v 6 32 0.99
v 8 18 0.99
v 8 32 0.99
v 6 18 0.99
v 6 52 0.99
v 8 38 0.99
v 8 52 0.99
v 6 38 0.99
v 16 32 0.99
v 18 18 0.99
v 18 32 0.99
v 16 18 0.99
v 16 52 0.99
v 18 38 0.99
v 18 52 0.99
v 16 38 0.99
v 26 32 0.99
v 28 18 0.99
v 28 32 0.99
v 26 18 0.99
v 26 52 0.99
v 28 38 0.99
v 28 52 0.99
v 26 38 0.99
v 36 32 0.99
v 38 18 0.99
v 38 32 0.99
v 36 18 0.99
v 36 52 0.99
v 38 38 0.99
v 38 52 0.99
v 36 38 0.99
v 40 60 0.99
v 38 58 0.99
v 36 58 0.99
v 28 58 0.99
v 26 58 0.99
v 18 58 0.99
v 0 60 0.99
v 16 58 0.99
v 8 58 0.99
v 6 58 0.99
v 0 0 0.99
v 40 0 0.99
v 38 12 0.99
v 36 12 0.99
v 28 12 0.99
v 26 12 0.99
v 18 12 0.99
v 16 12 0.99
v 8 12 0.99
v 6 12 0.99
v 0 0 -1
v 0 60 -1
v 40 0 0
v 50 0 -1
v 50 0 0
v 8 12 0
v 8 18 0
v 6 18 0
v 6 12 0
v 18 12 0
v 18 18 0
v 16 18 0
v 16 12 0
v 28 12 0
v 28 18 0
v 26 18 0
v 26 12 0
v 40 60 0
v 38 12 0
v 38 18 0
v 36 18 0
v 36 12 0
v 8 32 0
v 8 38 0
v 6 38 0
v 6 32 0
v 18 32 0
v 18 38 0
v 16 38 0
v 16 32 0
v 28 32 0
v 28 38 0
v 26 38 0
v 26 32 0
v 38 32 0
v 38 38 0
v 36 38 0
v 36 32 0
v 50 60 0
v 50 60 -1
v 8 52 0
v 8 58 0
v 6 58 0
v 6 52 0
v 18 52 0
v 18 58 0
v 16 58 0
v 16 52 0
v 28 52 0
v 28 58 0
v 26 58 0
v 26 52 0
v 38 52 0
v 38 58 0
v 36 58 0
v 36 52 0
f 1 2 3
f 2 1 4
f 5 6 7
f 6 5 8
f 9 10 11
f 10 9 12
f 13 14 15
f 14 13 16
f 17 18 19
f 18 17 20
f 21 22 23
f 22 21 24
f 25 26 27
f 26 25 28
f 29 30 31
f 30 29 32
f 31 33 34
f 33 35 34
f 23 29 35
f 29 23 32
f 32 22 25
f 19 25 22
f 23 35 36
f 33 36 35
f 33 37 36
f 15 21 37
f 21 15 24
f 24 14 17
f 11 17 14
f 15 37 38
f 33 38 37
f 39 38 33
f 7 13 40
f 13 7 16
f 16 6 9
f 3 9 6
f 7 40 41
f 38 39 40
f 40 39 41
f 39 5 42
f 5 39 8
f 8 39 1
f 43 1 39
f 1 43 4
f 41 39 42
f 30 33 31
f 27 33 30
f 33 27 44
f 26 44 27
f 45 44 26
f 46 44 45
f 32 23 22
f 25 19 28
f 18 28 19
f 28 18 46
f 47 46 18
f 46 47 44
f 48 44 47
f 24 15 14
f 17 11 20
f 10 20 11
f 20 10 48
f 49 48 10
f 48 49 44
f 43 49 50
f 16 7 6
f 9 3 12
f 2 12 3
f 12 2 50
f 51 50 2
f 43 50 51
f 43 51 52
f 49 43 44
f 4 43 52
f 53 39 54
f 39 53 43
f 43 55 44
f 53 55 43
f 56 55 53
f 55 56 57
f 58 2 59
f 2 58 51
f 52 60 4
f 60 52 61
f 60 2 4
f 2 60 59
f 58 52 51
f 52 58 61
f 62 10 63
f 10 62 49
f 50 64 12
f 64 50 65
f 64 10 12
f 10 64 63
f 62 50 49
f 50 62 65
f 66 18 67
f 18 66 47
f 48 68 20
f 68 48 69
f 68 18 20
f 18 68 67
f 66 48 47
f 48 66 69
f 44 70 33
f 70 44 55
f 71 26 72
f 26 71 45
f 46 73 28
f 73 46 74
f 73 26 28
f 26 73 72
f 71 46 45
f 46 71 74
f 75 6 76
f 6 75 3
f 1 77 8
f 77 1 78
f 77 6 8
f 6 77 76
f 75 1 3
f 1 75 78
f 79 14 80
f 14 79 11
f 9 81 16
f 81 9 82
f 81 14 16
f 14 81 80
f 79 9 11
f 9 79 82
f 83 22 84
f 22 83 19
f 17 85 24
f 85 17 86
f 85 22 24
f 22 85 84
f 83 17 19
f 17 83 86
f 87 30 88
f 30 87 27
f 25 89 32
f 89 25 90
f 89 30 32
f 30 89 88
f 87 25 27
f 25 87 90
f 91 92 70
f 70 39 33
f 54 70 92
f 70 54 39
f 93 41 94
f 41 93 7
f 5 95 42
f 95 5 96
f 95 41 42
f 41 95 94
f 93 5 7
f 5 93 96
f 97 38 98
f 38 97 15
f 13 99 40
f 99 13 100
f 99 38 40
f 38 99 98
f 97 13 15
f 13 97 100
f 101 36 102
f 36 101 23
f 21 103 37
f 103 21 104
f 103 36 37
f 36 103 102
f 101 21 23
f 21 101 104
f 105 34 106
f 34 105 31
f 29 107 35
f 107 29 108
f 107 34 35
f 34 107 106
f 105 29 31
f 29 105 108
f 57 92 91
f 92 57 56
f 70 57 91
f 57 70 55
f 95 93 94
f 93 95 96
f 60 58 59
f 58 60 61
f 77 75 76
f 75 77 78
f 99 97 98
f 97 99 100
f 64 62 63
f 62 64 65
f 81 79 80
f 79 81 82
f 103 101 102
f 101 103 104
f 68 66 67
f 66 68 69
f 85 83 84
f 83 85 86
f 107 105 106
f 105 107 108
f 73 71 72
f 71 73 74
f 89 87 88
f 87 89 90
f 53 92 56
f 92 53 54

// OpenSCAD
// file: ../../Base/Boxes.scad
// Fischertechnik Box Foundation
// Pre-designed Boxes

use <Constants.scad>

include <PlacementOptions.scad>

box190Width = 190;
box190Depth = 130;
box130Width = 130;
box130Depth = 95;
boxUsageHeight = 33.9;
boxWallThickness = 2.4;
boxBaseThickness = 1.0;
boxWebWidth = 3.0;

// getBoxWallThickness()
// Gets the wall thickness of a Fischertechnik Box

function getBoxWallThickness() = boxWallThickness;

// Gets the usable height of a fischertechnik box
function getBoxUsageHeight() = boxUsageHeight;

// Gets the thickness of the Fischertechnik box base.
function getBoxBaseThickness() = boxBaseThickness;

// Gets the width of a box web
function getBoxWebWidth() = boxWebWidth;

// Gets the usable inner space of a Box 190 as an x/y-list
function getBox190Space() = [
    box190Width - 2*getBoxWallThickness(), 
    box190Depth - 2*getBoxWallThickness() ];

// Imports the Fischertechnik empty box 130x190 mm and places it at position 0,0
// 190x130 are the outer sizes, the inner space is slightly smaller. Use getBox190Space() to get the inner sizes.
// This module needs the STL file "Fischertechnik Box 130x190.stl" in the library path.
// The box is positioned that the usable inner space is at the 0,0,0 position. The

module Box190() {
    translate([-getBoxWallThickness(),-getBoxWallThickness(),-getBoxBaseThickness()])
        import("Fischertechnik Box 130x190.stl", convexity=3);
}

// Gets the usable inner space of a Box 130 as an x/y-list
function getBox130Space() = [
    box130Width - 2*getBoxWallThickness(), 
    box130Depth - 2*getBoxWallThickness() ];

// Imports the Fischertechnik empty box 95x130 mm and places it at position 0,0
// 190x130 are the outer sizes, the inner space is slightly smaller. Use getBox190Space() to get the inner sizes.
// This module needs the STL file "Fischertechnik Box 95x130.stl" in the library path.
// The box is positioned that the usable inner space is at the 0,0,0 position. The

module Box130() {
    translate([-getBoxWallThickness(),-getBoxWallThickness(),-getBoxBaseThickness()])
        import("Fischertechnik Box 95x130.stl", convexity=3);
}

// Creates a web at the specified box walls
// corner 0 = LowerLeft, 1 = UpperLeft, 2 = UpperRight, 3 = LowerRight
// side 0 = LeftOfCorner, 1 = RightOfCorner
// distance = Distance in mm from the corner
// box = inner width and depth of the box (default: Box 190)
// webWidth = length of the web (default is 3 mms)
// webThickness = thickness of the web (default is 1 mm)

module BoxWeb(corner, side, distance, box=getBox190Space(), webWidth=getBoxWebWidth(), webThickness=1.0) {
    sink = getBoxWallThickness()/2;

    width = (corner % 2 == 0) ? 
            (side == LeftOfCorner ? webWidth : webThickness) :
            (side == LeftOfCorner ? webThickness : webWidth);

    depth = (corner % 2 == 0) ? 
            (side == RightOfCorner ? webWidth : webThickness) :
            (side == RightOfCorner ? webThickness : webWidth);
    
    xDiff = corner == LowerLeft ? 
                (side == LeftOfCorner ? -sink : distance) :
            (corner == UpperLeft ?                
                (side == LeftOfCorner ? distance : -sink) :
            (corner == UpperRight ?
                (side == LeftOfCorner ? box.x-webWidth+sink : box.x-distance-webThickness) :
                (side == LeftOfCorner ? box.x-distance-webThickness: box.x-webWidth+sink)));

    yDiff = corner == LowerLeft ? 
                (side == RightOfCorner ? -sink : distance) :
            (corner == UpperLeft ?
                (side == RightOfCorner ? box.y-distance : box.y-webWidth+sink) :
            (corner == UpperRight ?
                (side == RightOfCorner ? box.y-webWidth+sink : box.y-distance) :
                (side == RightOfCorner ? distance : -sink)));
    
    translate([xDiff, yDiff, -getExcess()])
        cube([width, depth, boxUsageHeight + 2*getExcess()]);
}
// file: ../../Base/Alignment.scad
// Fischertechnik Box Foundation
// Geometry Helpers Alignment

include <PlacementOptions.scad>

// getAlignedX(elementWidth, spaceWidth, align=AlignRight, offset=0)
// Gets the aligned X offset of an element with the given
// width in the given space.
// elementWidth = The width of the element to positon
// spaceWidth = The space where the element should be aligned
// align = 0 AlignLeft, 1 AlignCenter, 2 AlignRight
// offset = an optional offset from the aligned position. When
// aligned left or centered, then positive values are in X direction.
// When aligned right then positive values are in negative X direction.

function getAlignedX(elementWidth, spaceWidth, align=AlignRight, offset=0) =
    (align == AlignLeft) ?
        offset :
        ((align == AlignCenter) ?
        (spaceWidth - elementWidth)/2 + offset :
        spaceWidth - offset - elementWidth);

// getAlignedY(elementDepth, spaceDepth, align=AlignTop, offset=0)
// Gets the aligned Y offset of an element with the given
// depth in the given space.
// elementDepth = The depth of the element to positon
// spaceDepth = The space where the element should be aligned
// align = 0 AlignBottom, 1 AlignCenter, 2 AlignTop
// offset = an optional offset from the aligned position. When
// aligned bottom or centered, then positive values are in Y direction.
// When aligned top then positive values are in negative Y direction.

function getAlignedY(elementDepth, spaceDepth, align=AlignTop, offset=0) =
    (align == AlignBottom) ?
        offset :
        ((align == AlignCenter) ?
        (spaceDepth - elementDepth)/2 + offset :
        spaceDepth - offset - elementDepth);
// file: ../../Base/Rotation.scad
// Fischertechnik Box Foundation
// Geometry Helpers Rotation

include <PlacementOptions.scad>

// getRotatedSpace(space, rotation=NoRotation)
// Rotates the space dependent on the specified rotation

function getRotatedSpace(space, rotation=NoRotation) = [
    (rotation == Rotate90 || rotation == Rotate270) ? space.y : space.x,
    (rotation == Rotate90 || rotation == Rotate270) ? space.x : space.y
];

// Rotates the given space around the fixed left lower corner
// space = the space the children needs as width/depth list [width,depth]
// rotation = 0 Rotate0 degrees, 1 Rotate90 degrees, 2 Rotate180 degrees, 3 Rotate270 degrees (equivalent to -90)

module RotateFix(space, rotation=Rotate0) {
    dy = (rotation == Rotate0 || rotation == Rotate270) ? 0 :
        (rotation == Rotate90) ? space.x :
        space.y;
    dx = (rotation < Rotate180) ? 0 :
        (rotation == Rotate180) ? space.x :
        space.y;
    
    translate([dx, dy, 0])
        rotate([0, 0, rotations[rotation]])
            children();
}
// file: ../../Base/Placement.scad
// Fischertechnik Box Foundation
// Geometry Helpers Placement

use <Constants.scad>
use <Alignment.scad>
use <Rotation.scad>
use <Boxes.scad>

include <PlacementOptions.scad>

// Place(x=0, y=0, elementSpace=[0,0], alignX=AlignLeft, alignY=AlignBottom, rotation=Rotate0, boxSpace=getBox190Space())
// Places the child at the specified position
// y = Y-Position. This is a relative position when an X aligment is specified.
// x = X-Position. This is a relative position when an Y aligment is specified.
// elementSpace = space of the element to be placed [x,y]
// alignX = -1=NoAlign, 0 AlignLeft, 1 AlignCenter, 3 AlignRight (elementSpace and boxSpace required!)
// alignY = -1=NoAlign, 2 AlignBottom, 1 AlignCenter, 4 AlignTop (elementSpace and boxSpace required!)
// rotation = 0 Rotate0 0 degrees, 1 Rotate90 90 degrees, 
// 2 Rotate180 180 degrees, 3 Rotate270 270 degrees (equivalent to -90)
// boxSpace = Inner space of the box where the placement occurs [x,y] - default is Box 190x130 inner space

module Place(x=0, y=0, elementSpace=[0,0], 
  alignX=AlignLeft, alignY=AlignBottom, 
  rotation=NoRotation, boxSpace=getBox190Space()) {

    module Position(x, y, space, rotation=Rotate0) {
        translate([x, y, 0])
            RotateFix(space, rotation)
                children();
    }

    space = getRotatedSpace(elementSpace, rotation);
    alignedX = getAlignedX(space.x, boxSpace.x, alignX, x);
    alignedY = getAlignedY(space.y, boxSpace.y, alignY, y);
    Position(alignedX, alignedY, elementSpace, rotation)
        children();
}

// Center(space=getBox130Space(), elementSpace=[0,0])
// space = Space where the children is centered. For cylinder use centered=true and no elementSpace.
// elementSpace = space of the element to be centered [x,y]

module Center(space=getBox190Space(), elementSpace=[0,0]) {
    Place(elementSpace=elementSpace, boxSpace=space, alignX=AlignCenter, alignY=AlignCenter)
        children();
}

// CenterHorizontal(width=0, y=0, offset=0, space=getBox130Space())
// width = Width of the element to be placed.
// y = Y position of the element
// offset = Offset from the center position (negative will be left of the center)
// space = Space where the element is placed

module CenterHorizontal(width=0, y=0, offset=0, space=getBox190Space()) {
    Place(x=offset, y=y, elementSpace=[width, 0], boxSpace=space, alignX=AlignCenter)
        children(0);
}

// CenterVertical(depth=0, x=0, offset=0, space=getBox130Space())
// depth = Depth of the element to be placed.
// x = X position of the element
// offset = Offset from the center position (negative will be down of the center)
// space = Space where the element is placed

module CenterVertical(depth=0, x=0, offset=0, space=getBox190Space()) {
    Place(x=x, y=offset, elementSpace=[0, depth], boxSpace=space, alignY=AlignCenter)
        children(0);
}

// getIsVertical(align)
// True if the specified alignment needs a vertical orientation for a divider (AlignRight, AlignLeft)

function getIsVertical(align) = (align == AlignRight || align == AlignLeft);

// getIsHorizontal(align)
// True if the specified alignment needs a horizontal orientation for a divider (AlignTop, AlignBottom)

function getIsHorizontal(align) = (align == AlignTop || align == AlignBottom);
// file: ../../Base/Constants.scad
// Fischertechnik Box Foundation
// Constants

// Constant values necessary for multiple elements

// Base constants
dividerThickness = 1.2;
excess = 0.01;
fragments = 90;
tolerance = 0.8;

// Gets the thickness of a divider 
function getDividerThickness() = dividerThickness;

// Gets the excess that is used to merge walls into each other
function getExcess() = excess;

// Gets amount of fragments of a cylinder
function getFragments() = fragments;

// Gets the inner tolerance of a frame to each side
function getTolerance() = tolerance;


// Fischertechnik specific constants
axisDiameter = 4;
axisBottomDiameter = axisDiameter + 1;
standardEdgeDistance = 2.5;
standardWebDistance = 11.5;
standardCornerLength = 15;
tubeWallFactor = 0.8;
smallPartsFrameHeight = 20;

// Gets axis diameter
function getAxisDiameter() = axisDiameter;

// Gets axis bottom diameter for thicker part at the bottom
function getAxisBottomDiameter() = axisBottomDiameter;

// gets the standard distance to the wall of the box for dockable frames with webs
function getStandardEdgeDistance() = standardEdgeDistance;

// gets the standard distance of each web to the corner of the dockable frame
function getStandardWebDistance() = standardWebDistance;

// gets the standard length of the corner walls of a dockable frame
function getStandardCornerLength() = standardCornerLength;

// gets the wall thickness of a tube.
function getTubeWallThickness() = tubeWallFactor * getDividerThickness();

// gets the frame height for docked small parts boxes.
function getSmallPartsFrameHeight() = smallPartsFrameHeight;
// file: ../TestHelper.scad
// Fischertechnik Box Foundation
// Test Helper

function getPlacementBaseSpace() = [50,60];
function getCubeSpace() = [10,20];

module PlacementBase() {
    color("green")
    translate([0, 0, -1])
        cube([getPlacementBaseSpace().x, getPlacementBaseSpace().y, 1]);
}

module Cube() {
    translate([0,0,-.01])
    difference() {
        cube([getCubeSpace().x,getCubeSpace().y,1]);
        translate([getCubeSpace().x*0.6, getCubeSpace().y*0.6, -1])
            cube([getCubeSpace().x*0.2,getCubeSpace().y*0.3,3]);
    }
}

module Deploy(distance=30) {
    for( i = [0:1:$children-1])
        translate([i*distance, 0])
            children(i);
}
// file: ../../Base/PlacementOptions.scad
// Fischertechnik Box Foundation
// Placement Options

// Alignment
NoAlign = 0;
AlignLeft = 1;
AlignBottom = 2;
AlignCenter = 3;
AlignRight = 4;
AlignTop = 5;

// Element rotation degree steps
rotations = [0, -90, -180, -270];

// Rotation
NoRotation = 0;
Rotate0 = 0;
Rotate90 = 1;
Rotate180 = 2;
Rotate270 = 3;

// Docking (seen from above)
NoDock = -1;
DockLeft = 0;
DockTop = 1;
DockRight = 2;
DockCorner = 2;
DockBottom = 3;

// Web corners
LowerLeft = 0;
UpperLeft = 1;
UpperRight = 2;
LowerRight = 3;

// Web position relative to corner
LeftOfCorner = 0;
RightOfCorner = 1;
// main file
// Fischertechnik Box Foundation
// Base
// Test DeploySame

use <../../Base/Deployment.scad>

include <../../Base/PlacementOptions.scad>

use <../TestHelper.scad>

/*PlacementBase();

DeploySame(getPlacementBaseSpace(), getCubeSpace())
    Cube();

translate([0, 20])
DeploySame(getPlacementBaseSpace(), getCubeSpace(), columns=3)
    Cube();

translate([0, 40])
DeploySame(getPlacementBaseSpace(), getCubeSpace(), columns=4)
    Cube();
    
translate([60, 0]) {
PlacementBase();
DeploySame(getPlacementBaseSpace(), getCubeSpace(), columns=4, rows=2)
    Cube();
}

translate([120, 0]) {
PlacementBase();
DeploySame(getPlacementBaseSpace(), getCubeSpace(), columns=2, rows=3, rotation=Rotate90)
    Cube();
}

translate([180, 0]) {
PlacementBase();
DeploySame([0,0], getCubeSpace(), columns=2, rows=3, rotation=Rotate90)
    Cube();
}

translate([240, 0]) {*/
PlacementBase();
DeploySame([0,0], getCubeSpace(), columns=4, rows=3)
    Cube();
//}
